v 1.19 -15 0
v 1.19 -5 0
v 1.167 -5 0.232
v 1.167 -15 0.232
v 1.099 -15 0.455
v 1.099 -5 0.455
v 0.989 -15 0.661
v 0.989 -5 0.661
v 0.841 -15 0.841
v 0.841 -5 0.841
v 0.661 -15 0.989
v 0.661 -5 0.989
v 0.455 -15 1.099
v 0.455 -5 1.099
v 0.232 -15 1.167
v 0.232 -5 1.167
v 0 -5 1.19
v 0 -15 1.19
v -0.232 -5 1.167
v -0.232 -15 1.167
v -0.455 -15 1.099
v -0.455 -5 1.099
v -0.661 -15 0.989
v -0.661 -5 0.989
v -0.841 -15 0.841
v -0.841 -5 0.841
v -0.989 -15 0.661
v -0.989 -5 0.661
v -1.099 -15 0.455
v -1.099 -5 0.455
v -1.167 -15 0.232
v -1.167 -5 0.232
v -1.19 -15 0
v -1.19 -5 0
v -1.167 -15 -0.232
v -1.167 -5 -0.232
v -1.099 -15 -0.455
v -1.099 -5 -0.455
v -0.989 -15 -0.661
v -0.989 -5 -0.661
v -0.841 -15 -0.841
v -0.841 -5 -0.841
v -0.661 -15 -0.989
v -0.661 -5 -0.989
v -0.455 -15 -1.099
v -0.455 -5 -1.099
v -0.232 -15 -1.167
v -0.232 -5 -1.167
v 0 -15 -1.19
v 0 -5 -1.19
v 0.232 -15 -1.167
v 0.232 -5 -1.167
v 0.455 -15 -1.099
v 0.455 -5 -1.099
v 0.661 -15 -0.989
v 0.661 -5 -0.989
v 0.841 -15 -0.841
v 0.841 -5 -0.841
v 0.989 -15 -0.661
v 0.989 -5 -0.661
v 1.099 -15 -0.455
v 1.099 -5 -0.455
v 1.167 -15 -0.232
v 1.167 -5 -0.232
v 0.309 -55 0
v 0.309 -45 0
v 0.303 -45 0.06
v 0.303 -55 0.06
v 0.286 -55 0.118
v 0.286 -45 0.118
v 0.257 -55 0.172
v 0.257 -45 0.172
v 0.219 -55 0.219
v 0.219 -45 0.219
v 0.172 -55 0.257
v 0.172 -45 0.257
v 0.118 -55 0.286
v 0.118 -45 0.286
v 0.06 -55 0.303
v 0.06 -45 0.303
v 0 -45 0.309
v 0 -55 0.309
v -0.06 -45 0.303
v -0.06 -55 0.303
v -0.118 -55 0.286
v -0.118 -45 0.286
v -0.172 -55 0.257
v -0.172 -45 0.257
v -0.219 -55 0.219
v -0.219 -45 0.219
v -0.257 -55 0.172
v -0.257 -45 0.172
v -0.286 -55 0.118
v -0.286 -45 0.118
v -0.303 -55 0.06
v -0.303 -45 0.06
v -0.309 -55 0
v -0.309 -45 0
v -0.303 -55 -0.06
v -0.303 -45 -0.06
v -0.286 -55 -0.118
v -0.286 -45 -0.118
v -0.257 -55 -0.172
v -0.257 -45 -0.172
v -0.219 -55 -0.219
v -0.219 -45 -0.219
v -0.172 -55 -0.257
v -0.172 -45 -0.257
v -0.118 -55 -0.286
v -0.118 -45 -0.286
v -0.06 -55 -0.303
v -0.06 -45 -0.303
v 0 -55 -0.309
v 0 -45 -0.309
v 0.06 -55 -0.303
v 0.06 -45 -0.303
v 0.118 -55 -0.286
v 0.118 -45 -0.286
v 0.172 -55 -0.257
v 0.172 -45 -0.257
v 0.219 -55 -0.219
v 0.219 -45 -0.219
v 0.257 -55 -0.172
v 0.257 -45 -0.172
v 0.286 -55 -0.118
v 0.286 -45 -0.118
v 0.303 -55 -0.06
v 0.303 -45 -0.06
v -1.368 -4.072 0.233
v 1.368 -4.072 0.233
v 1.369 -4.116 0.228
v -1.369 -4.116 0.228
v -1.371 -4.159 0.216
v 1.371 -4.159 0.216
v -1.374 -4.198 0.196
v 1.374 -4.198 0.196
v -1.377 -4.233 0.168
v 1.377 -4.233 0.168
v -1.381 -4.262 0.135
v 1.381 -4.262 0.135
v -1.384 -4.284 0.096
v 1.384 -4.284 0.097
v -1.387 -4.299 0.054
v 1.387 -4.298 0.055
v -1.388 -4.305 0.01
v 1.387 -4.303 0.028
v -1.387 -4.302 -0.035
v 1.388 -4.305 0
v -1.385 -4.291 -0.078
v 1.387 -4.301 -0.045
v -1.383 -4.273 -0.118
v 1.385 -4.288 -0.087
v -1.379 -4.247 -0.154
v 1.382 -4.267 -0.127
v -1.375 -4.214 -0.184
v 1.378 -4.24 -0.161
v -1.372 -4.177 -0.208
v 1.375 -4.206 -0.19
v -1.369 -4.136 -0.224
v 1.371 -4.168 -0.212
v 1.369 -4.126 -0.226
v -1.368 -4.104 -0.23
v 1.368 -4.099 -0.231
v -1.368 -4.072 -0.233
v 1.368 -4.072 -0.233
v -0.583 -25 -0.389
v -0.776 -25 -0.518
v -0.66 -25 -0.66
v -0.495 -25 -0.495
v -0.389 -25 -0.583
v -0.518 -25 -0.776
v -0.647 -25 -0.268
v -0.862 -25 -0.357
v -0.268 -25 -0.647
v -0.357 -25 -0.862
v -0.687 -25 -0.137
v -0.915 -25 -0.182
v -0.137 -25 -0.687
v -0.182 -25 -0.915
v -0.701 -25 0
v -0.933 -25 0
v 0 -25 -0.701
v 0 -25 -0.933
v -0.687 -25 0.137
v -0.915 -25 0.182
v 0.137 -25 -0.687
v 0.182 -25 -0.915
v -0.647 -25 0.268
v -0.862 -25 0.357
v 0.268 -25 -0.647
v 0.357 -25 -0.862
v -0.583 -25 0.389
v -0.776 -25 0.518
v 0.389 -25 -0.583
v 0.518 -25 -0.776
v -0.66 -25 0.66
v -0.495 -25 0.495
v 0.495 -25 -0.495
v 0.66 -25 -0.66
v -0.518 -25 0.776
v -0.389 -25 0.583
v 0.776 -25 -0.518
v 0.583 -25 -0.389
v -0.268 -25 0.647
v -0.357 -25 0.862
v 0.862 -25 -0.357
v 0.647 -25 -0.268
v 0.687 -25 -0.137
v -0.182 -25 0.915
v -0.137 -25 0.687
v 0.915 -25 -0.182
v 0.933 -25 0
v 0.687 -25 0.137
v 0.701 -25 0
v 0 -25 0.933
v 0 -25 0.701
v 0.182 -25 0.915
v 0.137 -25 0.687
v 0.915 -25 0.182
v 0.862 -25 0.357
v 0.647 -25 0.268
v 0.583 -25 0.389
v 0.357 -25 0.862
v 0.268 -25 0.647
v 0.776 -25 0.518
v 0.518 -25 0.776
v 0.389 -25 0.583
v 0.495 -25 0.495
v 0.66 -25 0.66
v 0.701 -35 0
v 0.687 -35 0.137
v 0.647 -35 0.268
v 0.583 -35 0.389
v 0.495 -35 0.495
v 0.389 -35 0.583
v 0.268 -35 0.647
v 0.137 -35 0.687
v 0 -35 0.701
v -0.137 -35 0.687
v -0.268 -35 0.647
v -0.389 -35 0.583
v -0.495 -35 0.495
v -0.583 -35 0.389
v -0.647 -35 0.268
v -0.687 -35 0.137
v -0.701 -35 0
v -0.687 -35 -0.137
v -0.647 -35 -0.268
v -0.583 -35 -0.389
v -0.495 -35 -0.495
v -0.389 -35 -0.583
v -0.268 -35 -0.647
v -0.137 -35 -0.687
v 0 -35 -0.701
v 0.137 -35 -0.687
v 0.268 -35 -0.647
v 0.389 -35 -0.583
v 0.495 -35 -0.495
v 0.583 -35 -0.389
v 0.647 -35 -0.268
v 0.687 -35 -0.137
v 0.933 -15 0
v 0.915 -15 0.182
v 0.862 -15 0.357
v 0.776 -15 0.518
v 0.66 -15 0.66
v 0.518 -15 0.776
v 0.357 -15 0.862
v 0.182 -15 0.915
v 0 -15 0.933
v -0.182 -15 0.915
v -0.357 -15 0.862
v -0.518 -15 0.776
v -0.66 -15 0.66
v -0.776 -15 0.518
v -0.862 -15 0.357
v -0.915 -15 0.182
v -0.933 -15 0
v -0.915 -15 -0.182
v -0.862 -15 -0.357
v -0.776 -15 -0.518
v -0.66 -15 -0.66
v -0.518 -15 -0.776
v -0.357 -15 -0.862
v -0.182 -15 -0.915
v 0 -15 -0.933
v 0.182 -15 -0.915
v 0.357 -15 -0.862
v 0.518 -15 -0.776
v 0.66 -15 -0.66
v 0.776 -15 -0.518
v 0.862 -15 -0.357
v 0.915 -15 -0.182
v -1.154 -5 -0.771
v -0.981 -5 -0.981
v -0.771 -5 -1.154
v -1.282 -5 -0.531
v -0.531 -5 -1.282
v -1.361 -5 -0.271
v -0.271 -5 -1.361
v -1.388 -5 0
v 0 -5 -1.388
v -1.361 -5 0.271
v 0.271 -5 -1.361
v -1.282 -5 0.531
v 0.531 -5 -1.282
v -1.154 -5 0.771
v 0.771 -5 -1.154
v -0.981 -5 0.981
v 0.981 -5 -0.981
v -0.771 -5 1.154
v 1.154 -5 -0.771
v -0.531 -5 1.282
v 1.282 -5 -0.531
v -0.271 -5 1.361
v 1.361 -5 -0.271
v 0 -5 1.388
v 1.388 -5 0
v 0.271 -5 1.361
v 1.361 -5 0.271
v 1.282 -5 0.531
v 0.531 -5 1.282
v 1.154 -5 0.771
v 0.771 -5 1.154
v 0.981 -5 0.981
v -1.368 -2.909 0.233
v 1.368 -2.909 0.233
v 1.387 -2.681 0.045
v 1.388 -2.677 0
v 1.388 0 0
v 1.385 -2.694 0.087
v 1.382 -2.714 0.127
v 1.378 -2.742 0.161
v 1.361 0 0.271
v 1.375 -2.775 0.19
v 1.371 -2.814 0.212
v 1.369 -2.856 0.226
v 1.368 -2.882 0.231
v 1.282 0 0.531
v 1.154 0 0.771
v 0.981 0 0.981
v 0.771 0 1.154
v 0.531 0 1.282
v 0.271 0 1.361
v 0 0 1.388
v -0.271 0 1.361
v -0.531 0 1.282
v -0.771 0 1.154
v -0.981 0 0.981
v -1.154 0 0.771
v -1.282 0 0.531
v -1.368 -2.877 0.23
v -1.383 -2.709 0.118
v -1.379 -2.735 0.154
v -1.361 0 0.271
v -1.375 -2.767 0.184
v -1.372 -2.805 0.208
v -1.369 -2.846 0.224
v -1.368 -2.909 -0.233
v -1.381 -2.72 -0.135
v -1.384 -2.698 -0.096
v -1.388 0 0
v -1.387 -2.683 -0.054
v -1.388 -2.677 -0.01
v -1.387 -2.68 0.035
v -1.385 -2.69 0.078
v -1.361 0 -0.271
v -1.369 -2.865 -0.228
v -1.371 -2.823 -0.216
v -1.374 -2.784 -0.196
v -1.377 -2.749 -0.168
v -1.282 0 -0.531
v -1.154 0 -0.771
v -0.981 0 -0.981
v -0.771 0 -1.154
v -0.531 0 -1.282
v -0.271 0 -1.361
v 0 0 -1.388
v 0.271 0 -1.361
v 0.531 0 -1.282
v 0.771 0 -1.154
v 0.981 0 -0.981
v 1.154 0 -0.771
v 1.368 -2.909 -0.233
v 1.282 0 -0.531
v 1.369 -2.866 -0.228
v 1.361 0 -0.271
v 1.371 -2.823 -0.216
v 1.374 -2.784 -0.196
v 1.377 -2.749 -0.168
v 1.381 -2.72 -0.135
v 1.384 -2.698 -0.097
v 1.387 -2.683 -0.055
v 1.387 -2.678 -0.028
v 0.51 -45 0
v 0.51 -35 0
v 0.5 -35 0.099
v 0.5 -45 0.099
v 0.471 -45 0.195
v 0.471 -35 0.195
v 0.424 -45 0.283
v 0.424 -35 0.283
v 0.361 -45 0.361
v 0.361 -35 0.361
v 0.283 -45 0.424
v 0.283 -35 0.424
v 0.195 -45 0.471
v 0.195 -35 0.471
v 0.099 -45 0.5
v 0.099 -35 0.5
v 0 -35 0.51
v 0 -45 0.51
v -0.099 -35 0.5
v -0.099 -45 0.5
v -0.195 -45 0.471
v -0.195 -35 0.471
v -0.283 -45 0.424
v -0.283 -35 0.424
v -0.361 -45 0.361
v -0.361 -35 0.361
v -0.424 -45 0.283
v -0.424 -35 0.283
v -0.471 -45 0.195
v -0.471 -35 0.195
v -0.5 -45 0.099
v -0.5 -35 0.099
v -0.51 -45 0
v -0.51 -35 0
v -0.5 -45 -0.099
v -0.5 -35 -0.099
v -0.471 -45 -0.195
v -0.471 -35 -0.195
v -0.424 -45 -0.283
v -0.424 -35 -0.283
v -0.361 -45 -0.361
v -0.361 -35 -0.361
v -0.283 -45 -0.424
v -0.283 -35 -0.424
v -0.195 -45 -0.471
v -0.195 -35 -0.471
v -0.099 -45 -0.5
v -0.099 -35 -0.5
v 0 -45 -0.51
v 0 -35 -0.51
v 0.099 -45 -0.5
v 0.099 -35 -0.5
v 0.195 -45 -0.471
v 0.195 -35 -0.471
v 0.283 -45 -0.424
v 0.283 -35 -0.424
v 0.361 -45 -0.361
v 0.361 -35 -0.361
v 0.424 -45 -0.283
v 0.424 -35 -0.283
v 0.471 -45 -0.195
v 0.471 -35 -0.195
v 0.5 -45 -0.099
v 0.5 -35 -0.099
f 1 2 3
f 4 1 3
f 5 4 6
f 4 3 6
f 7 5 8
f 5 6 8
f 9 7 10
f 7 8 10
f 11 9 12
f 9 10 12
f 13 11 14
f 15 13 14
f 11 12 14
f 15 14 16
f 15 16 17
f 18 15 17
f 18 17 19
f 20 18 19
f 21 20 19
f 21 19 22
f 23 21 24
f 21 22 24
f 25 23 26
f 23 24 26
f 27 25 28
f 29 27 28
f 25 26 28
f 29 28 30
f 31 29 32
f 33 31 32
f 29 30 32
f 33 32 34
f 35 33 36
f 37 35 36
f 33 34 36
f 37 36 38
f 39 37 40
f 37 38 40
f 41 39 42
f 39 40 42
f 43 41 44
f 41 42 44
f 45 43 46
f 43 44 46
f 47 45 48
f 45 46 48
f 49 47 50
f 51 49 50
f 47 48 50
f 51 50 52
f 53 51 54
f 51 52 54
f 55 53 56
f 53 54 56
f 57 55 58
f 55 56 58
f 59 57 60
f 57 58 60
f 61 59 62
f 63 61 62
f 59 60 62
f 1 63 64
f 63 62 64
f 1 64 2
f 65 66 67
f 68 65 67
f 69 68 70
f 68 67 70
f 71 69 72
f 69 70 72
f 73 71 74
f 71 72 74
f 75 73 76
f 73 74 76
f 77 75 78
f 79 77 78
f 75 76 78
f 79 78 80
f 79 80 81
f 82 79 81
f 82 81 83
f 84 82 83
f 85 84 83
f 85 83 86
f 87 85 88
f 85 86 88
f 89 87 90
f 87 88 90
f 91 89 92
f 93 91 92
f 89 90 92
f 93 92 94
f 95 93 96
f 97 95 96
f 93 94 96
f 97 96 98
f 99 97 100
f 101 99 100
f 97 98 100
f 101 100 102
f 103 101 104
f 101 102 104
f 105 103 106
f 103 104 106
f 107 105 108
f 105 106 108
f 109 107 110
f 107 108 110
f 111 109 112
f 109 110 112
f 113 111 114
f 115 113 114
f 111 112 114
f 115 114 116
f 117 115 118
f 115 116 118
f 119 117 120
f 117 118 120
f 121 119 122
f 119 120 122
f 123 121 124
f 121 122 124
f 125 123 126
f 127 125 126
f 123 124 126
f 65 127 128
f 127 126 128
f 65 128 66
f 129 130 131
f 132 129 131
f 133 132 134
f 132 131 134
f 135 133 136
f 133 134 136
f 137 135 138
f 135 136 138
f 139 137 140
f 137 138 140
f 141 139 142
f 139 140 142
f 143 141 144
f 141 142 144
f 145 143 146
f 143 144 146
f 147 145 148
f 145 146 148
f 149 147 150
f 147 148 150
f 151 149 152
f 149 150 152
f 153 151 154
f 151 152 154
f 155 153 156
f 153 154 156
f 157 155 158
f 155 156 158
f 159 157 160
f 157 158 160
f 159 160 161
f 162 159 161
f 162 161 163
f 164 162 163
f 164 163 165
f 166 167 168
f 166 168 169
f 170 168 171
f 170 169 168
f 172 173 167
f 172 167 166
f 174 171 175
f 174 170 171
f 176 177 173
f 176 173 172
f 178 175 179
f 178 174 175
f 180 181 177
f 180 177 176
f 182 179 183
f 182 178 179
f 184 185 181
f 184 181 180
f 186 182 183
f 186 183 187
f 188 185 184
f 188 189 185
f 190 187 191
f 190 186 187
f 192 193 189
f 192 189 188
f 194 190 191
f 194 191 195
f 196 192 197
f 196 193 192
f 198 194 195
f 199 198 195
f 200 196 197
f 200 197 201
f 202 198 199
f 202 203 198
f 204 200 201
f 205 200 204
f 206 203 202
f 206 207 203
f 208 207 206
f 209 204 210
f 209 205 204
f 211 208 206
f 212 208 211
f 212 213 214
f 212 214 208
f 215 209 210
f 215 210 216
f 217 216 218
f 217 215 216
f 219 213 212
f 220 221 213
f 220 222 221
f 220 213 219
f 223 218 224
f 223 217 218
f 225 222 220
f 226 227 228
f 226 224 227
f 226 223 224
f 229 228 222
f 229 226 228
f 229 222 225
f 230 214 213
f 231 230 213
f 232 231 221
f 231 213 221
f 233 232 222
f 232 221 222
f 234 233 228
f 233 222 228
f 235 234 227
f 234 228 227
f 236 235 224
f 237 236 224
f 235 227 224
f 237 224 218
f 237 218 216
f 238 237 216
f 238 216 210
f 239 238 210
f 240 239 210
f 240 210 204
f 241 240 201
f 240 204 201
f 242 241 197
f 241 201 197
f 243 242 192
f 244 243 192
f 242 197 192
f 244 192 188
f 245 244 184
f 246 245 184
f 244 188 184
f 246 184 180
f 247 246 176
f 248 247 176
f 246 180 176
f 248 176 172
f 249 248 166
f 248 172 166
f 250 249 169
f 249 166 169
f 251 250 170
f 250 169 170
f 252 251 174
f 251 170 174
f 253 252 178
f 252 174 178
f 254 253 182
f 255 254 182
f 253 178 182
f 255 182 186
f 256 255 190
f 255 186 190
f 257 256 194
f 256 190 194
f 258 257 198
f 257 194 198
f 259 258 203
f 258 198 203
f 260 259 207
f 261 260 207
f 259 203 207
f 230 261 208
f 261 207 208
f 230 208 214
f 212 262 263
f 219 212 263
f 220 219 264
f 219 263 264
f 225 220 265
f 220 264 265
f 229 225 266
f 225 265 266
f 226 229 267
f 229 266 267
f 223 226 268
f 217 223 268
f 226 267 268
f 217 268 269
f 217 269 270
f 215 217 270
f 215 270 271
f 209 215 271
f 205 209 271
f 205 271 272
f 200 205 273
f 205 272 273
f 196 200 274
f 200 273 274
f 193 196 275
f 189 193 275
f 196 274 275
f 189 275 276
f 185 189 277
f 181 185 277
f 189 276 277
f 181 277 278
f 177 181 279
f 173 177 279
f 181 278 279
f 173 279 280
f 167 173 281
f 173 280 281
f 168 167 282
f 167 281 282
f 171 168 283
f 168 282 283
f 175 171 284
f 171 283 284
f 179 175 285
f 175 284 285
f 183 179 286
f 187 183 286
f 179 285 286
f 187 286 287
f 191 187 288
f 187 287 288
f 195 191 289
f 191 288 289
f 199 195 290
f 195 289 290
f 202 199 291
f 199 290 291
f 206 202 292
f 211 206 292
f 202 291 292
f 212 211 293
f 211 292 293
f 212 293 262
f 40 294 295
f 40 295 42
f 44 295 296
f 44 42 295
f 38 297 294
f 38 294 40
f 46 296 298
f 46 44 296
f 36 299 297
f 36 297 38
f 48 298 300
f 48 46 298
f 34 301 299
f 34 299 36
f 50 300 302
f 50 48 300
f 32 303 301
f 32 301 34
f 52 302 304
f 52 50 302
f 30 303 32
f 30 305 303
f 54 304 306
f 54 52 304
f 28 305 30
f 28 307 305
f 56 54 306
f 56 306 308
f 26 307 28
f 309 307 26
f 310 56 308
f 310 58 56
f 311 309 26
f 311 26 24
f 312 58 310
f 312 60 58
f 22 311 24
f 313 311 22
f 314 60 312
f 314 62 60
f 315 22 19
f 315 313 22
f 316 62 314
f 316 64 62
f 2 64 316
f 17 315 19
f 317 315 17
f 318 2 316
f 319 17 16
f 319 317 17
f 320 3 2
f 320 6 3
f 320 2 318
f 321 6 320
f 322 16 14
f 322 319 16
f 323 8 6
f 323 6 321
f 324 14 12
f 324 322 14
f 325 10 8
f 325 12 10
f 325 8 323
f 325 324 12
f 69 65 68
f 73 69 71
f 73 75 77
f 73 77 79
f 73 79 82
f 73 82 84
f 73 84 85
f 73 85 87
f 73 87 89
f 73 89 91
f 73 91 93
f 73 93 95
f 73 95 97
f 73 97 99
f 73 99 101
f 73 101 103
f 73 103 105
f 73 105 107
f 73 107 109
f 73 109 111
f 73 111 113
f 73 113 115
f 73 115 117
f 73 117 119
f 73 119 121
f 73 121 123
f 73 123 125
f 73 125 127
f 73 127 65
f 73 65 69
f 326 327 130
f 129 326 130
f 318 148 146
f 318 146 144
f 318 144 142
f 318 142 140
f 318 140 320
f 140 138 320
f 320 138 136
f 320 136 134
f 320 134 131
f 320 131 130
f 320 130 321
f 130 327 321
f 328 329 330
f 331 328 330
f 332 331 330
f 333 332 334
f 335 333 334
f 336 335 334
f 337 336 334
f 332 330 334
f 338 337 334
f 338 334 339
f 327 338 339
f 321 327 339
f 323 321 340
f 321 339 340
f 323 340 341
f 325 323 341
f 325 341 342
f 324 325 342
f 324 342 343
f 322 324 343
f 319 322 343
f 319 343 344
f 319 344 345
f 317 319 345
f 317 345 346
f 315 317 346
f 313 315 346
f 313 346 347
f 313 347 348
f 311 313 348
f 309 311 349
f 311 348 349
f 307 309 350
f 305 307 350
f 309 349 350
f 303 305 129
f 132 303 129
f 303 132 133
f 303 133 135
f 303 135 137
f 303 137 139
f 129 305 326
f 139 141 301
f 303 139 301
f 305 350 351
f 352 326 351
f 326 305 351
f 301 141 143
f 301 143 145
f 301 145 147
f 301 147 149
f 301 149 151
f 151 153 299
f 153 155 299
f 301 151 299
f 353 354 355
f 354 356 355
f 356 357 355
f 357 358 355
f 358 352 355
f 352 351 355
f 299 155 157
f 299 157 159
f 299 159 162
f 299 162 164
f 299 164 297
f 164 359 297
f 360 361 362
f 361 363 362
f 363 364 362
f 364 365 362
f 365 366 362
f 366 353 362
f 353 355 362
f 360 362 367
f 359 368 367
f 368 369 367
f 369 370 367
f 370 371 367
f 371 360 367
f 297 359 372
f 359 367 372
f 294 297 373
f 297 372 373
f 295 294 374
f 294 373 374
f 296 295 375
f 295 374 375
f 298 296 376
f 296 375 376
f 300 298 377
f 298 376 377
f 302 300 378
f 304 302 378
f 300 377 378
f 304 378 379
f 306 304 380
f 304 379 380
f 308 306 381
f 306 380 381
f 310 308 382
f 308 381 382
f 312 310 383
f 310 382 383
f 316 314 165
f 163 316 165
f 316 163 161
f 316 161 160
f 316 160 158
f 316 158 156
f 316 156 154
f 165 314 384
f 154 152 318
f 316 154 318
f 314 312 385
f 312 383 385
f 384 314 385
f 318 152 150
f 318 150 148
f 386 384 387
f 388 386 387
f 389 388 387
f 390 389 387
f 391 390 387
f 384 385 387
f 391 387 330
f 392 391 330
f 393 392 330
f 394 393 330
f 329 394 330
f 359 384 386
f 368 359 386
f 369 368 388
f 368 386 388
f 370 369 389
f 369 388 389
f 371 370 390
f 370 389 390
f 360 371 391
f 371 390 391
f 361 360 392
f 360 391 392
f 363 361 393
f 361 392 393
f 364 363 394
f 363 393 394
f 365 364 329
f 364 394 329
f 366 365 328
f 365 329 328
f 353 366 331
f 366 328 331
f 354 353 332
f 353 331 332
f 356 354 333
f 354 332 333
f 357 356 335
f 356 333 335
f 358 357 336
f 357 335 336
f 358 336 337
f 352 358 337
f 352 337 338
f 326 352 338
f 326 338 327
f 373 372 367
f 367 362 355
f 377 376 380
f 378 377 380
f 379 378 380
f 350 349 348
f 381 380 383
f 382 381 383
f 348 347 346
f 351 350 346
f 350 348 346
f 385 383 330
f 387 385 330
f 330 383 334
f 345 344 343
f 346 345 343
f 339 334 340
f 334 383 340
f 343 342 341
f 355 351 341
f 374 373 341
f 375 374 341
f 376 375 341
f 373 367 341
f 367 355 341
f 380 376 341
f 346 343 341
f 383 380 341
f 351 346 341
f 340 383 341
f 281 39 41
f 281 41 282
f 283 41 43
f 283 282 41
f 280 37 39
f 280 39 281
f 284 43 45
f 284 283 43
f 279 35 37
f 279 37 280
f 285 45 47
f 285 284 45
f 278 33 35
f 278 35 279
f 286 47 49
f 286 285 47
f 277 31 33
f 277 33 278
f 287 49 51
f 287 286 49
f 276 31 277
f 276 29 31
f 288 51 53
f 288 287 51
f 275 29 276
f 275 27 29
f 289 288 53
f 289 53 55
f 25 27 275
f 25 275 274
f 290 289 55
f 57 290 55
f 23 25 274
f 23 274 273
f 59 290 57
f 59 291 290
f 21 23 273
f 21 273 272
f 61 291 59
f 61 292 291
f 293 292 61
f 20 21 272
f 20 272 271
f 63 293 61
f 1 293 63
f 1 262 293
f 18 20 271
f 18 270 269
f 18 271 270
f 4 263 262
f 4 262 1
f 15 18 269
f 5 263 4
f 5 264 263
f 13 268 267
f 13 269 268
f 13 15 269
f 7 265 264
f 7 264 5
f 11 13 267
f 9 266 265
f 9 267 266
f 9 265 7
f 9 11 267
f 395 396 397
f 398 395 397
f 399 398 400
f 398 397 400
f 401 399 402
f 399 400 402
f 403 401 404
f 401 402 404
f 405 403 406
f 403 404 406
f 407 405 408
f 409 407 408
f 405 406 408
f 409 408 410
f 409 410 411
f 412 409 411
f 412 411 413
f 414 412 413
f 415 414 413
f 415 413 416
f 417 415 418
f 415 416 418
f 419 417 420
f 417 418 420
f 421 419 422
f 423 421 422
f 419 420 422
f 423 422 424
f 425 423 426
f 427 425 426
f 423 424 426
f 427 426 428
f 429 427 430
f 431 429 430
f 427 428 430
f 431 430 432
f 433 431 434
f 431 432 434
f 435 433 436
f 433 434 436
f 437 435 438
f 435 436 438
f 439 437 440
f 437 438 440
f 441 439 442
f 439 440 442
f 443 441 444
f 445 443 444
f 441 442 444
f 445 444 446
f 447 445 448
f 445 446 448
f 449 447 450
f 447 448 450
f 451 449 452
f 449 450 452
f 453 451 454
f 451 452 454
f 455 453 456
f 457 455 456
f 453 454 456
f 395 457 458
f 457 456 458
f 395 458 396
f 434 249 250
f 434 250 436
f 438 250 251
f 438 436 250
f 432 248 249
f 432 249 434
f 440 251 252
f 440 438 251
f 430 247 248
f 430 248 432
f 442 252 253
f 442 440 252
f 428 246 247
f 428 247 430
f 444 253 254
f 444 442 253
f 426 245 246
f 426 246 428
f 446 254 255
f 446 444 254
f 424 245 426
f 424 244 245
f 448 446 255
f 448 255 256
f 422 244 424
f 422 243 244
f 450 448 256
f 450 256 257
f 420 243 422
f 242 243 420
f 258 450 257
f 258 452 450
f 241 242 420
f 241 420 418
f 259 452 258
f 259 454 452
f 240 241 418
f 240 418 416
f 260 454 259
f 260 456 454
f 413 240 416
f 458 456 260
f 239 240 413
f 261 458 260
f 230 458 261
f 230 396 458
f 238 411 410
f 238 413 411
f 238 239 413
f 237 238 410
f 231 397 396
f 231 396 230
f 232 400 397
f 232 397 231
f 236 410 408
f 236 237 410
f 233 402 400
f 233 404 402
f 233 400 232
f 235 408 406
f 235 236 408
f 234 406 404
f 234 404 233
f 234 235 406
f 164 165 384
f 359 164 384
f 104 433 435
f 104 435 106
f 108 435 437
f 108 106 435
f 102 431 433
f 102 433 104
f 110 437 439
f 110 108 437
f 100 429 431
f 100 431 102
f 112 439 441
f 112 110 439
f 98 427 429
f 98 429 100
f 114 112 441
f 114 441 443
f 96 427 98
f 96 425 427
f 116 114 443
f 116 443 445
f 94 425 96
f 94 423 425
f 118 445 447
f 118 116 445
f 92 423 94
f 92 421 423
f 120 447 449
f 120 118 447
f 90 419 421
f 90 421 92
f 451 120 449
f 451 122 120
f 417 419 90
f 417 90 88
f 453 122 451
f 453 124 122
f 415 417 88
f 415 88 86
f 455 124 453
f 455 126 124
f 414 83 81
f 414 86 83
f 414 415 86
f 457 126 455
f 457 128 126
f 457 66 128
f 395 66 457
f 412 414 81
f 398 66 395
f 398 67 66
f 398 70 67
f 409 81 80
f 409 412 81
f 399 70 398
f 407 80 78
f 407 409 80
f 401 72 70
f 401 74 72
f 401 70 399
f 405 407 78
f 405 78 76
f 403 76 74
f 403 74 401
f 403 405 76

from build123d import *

# Parameters (mm, degrees)
F0_R      = 1.387608
F1_DEPTH  = 5
F2_R      = 1.189862
F3_DEPTH  = 10
F4_R      = 0.933138
F5_DEPTH  = 10
F6_R      = 0.70066
F7_DEPTH  = 10
F8_R      = 0.509978
F9_DEPTH  = 10
F10_R     = 0.309305
F11_DEPTH = 10
F13_DEPTH = 12.5


with BuildPart() as f1:
    # F0 (on Front) → F1 (new body)
    with BuildSketch(Plane.XZ):
        Circle(F0_R)
    extrude(amount=F1_DEPTH)

    # F2 (on face) → F3 (join)
    with BuildSketch(Plane.XZ.offset(5)):
        Circle(F2_R)
    extrude(amount=F3_DEPTH)

    # F4 (on face) → F5 (join)
    with BuildSketch(Plane.XZ.offset(15)):
        Circle(F4_R)
    extrude(amount=F5_DEPTH)

    # F6 (on face) → F7 (join)
    with BuildSketch(Plane.XZ.offset(25)):
        Circle(F6_R)
    extrude(amount=F7_DEPTH)

    # F8 (on face) → F9 (join)
    with BuildSketch(Plane.XZ.offset(35)):
        Circle(F8_R)
    extrude(amount=F9_DEPTH)

    # F10 (on face) → F11 (join)
    with BuildSketch(Plane.XZ.offset(45)):
        Circle(F10_R)
    extrude(amount=F11_DEPTH)

    # F12 (on Right) → F13 (cut, symmetric)
    with BuildSketch(Plane.YZ):
        with BuildLine():
            Line((-2.909436, 0.232579), (-4.072334, 0.232579))
            ThreePointArc((-4.072334, 0.232579), (-4.304913, 0), (-4.072334, -0.232579))
            Line((-4.072334, -0.232579), (-2.909436, -0.232579))
            ThreePointArc((-2.909436, -0.232579), (-2.676857, 0), (-2.909436, 0.232579))
        make_face()
    extrude(amount=F13_DEPTH, both=True, mode=Mode.SUBTRACT)


solid = f1.part
